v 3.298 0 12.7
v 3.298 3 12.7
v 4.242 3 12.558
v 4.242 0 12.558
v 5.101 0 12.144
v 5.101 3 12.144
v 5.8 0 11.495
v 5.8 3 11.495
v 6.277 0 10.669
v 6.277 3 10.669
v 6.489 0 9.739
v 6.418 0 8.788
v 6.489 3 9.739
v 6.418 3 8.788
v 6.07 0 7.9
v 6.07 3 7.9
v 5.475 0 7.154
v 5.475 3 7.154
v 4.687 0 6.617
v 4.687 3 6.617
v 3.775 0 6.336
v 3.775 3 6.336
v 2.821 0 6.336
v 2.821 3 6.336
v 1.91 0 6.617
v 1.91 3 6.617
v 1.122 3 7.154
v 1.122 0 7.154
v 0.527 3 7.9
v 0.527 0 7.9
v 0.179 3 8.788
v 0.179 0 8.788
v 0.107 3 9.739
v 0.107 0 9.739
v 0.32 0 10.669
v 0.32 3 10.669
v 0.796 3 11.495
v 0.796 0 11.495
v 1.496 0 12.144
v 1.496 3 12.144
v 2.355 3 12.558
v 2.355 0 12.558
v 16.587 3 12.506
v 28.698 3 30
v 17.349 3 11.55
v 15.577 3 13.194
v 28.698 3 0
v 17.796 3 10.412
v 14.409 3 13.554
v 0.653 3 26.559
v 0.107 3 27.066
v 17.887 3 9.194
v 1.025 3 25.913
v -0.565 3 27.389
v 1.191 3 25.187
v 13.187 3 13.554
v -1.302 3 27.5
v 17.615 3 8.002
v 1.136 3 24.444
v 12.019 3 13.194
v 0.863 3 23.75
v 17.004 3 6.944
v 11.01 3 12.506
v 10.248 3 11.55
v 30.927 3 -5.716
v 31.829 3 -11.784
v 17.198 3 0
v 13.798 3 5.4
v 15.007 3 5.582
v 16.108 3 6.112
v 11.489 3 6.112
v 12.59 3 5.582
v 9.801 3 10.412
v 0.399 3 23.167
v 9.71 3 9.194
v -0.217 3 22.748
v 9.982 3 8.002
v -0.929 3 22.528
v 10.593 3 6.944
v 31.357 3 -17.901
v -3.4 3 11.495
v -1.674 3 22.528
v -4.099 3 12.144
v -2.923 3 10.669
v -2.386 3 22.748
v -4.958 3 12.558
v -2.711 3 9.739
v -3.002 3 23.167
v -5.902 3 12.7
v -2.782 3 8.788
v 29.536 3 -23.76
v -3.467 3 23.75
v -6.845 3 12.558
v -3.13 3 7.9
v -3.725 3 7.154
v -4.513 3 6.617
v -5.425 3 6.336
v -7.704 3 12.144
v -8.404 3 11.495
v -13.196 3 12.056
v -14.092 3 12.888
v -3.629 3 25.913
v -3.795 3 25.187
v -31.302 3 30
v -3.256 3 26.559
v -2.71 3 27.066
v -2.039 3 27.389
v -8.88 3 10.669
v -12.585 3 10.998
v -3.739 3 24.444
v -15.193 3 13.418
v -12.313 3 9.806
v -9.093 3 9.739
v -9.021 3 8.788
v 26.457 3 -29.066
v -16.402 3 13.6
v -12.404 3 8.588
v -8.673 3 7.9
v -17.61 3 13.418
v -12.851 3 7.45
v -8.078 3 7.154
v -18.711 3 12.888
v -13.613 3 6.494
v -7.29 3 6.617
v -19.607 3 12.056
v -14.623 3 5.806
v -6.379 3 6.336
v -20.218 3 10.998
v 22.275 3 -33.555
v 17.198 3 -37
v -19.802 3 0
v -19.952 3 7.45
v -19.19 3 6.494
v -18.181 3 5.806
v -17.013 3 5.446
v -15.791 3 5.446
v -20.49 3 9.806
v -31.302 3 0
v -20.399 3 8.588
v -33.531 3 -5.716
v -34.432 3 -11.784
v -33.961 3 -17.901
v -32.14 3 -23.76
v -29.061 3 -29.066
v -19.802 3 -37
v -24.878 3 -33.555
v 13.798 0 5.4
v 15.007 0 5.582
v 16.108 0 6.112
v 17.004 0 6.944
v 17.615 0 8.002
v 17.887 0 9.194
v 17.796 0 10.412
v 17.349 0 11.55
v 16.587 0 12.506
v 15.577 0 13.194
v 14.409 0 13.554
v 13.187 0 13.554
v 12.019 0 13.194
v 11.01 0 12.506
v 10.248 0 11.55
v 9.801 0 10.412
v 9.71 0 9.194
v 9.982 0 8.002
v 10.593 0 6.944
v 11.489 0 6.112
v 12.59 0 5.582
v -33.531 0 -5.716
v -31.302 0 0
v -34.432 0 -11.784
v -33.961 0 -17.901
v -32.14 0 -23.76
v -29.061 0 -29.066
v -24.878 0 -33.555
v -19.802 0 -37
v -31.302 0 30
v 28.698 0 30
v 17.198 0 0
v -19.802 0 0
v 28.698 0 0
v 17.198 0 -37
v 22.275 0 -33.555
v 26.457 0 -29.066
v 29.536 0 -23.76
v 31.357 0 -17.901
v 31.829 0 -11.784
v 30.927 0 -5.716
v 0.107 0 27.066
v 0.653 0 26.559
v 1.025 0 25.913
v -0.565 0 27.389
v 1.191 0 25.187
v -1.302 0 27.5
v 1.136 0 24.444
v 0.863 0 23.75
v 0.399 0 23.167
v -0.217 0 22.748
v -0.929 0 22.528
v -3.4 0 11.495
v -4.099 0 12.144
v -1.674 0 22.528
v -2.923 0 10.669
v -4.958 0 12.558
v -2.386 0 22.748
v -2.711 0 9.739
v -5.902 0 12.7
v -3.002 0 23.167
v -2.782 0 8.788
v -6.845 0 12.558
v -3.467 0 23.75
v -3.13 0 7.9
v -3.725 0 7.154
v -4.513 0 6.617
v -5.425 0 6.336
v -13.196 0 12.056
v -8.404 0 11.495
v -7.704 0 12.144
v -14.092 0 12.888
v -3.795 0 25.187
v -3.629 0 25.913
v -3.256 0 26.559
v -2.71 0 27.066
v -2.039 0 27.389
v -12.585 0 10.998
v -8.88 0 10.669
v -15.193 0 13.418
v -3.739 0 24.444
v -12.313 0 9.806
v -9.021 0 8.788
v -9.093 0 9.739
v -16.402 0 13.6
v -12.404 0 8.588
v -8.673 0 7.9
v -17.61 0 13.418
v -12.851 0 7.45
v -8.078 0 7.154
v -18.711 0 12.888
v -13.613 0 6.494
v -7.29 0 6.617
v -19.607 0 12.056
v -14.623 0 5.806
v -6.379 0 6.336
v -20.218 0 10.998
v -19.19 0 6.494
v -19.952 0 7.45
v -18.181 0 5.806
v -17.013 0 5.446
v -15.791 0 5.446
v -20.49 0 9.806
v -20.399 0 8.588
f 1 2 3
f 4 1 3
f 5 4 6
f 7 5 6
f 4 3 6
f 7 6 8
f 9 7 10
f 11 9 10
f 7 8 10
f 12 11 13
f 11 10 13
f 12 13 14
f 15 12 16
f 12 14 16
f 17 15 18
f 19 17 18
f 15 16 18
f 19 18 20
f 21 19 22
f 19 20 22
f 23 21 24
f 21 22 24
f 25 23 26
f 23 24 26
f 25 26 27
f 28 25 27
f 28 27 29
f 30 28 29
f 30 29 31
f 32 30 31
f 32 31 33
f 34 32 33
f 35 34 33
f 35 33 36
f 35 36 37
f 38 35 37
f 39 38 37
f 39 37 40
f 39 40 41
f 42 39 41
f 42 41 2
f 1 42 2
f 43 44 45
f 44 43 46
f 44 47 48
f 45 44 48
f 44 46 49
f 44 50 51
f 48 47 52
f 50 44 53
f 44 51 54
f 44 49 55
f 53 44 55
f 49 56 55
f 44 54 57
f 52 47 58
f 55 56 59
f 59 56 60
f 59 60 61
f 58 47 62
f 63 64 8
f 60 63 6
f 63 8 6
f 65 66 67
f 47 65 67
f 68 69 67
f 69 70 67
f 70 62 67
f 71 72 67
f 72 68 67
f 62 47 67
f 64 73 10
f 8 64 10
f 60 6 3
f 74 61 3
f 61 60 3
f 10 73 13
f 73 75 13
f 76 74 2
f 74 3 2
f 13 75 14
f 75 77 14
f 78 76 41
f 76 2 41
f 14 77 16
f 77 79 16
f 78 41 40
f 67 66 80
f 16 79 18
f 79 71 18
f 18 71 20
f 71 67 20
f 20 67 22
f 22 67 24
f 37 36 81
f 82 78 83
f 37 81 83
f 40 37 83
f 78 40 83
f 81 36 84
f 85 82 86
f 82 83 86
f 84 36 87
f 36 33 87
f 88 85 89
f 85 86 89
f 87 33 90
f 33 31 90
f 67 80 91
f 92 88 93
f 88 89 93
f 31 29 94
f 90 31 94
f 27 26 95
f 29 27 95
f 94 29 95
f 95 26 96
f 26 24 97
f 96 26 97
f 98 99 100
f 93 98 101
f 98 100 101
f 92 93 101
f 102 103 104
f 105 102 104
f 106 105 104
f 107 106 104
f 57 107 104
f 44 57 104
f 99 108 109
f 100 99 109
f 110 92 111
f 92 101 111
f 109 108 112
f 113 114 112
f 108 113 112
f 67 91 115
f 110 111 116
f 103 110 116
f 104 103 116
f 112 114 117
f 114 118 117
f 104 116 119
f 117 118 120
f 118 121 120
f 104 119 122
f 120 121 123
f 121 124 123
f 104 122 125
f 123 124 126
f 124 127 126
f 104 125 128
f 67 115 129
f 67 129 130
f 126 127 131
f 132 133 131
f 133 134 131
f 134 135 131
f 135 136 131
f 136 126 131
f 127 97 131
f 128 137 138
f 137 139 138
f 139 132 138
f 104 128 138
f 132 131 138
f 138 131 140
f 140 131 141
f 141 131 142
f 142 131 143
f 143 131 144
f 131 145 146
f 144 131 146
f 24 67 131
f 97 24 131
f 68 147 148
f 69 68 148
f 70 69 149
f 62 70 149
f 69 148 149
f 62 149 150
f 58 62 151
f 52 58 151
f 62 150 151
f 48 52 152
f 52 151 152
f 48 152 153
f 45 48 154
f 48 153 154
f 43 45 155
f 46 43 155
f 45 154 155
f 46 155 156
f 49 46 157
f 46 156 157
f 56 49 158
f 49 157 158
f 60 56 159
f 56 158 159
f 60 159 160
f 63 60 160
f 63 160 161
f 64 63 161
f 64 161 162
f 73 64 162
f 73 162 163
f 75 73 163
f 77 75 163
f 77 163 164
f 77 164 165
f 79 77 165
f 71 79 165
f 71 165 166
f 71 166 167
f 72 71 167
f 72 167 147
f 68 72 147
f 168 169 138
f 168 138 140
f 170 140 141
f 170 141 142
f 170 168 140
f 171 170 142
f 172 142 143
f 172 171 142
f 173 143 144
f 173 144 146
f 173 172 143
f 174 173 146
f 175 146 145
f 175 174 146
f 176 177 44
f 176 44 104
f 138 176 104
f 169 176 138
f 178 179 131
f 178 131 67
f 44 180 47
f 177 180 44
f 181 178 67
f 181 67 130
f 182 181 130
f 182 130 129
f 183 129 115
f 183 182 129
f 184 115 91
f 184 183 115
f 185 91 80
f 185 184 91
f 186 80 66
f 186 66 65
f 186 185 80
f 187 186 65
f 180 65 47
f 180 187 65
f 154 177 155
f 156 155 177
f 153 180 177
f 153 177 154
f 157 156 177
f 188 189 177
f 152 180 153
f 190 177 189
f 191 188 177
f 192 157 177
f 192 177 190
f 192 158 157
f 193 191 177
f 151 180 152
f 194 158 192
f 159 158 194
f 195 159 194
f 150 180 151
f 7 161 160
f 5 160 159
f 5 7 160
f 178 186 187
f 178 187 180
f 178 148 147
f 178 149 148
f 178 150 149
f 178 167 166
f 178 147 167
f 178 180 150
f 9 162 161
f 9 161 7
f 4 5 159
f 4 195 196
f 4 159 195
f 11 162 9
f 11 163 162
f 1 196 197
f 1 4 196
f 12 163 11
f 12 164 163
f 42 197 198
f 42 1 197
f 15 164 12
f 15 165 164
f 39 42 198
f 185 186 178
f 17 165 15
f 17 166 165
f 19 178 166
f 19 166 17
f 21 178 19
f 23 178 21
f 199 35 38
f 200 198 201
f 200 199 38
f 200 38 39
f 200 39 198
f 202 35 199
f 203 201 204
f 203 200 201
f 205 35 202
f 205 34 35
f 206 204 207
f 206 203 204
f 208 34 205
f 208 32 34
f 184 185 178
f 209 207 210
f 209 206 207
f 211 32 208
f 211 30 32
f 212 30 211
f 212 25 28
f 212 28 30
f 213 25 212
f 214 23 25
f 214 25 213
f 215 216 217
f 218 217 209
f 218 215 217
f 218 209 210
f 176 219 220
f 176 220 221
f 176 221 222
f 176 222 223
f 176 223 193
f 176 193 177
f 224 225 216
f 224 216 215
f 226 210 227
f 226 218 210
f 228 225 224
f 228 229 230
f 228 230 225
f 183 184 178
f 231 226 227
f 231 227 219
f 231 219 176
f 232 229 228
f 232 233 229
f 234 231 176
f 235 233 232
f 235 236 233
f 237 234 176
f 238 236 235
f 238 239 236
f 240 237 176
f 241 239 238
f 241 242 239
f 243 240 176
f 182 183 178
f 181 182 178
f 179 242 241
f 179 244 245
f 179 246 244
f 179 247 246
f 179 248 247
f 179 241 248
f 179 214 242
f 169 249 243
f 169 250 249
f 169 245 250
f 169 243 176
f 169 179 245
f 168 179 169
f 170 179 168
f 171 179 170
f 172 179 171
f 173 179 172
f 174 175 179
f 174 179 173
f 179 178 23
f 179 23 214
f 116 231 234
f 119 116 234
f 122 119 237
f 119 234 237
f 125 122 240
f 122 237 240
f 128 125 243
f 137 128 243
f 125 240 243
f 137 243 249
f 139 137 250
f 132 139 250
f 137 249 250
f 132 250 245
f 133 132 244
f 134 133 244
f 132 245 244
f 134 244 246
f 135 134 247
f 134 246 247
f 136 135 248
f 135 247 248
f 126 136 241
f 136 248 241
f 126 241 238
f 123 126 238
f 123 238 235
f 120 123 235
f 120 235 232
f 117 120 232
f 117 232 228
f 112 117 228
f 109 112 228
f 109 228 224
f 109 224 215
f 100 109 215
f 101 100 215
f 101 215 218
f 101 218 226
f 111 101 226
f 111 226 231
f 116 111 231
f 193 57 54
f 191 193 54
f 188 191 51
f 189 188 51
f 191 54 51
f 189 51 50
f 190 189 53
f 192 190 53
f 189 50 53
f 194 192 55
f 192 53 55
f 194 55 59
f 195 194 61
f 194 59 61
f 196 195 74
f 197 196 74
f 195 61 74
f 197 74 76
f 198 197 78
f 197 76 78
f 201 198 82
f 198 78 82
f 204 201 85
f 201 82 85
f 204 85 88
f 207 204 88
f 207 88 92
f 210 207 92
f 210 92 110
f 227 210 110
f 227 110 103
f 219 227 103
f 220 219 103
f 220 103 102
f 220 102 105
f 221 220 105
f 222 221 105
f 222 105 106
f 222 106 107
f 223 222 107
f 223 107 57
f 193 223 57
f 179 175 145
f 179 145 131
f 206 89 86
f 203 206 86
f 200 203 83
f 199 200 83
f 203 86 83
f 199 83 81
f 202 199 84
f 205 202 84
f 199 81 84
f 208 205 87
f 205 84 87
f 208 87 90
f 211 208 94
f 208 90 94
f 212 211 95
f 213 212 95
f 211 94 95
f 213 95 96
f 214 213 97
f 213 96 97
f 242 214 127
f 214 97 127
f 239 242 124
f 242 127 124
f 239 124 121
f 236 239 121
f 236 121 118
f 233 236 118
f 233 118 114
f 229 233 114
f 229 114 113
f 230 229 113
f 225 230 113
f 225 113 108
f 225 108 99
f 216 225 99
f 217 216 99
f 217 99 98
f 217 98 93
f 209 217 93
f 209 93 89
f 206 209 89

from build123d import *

# Parameters (mm, degrees)
BOSS_EXTRUDE1_DEPTH = 3
SKETCH2_R           = 2.5
CUT_EXTRUDE1_DEPTH  = 20
SKETCH3_W           = 5
SKETCH3_H           = 5
CUT_EXTRUDE2_DEPTH  = 10
SKETCH4_R           = 4.1
CUT_EXTRUDE3_DEPTH  = 10
SKETCH5_R           = 3.2
CUT_EXTRUDE4_DEPTH  = 10


with BuildPart() as part:
    # Sketch1 → Boss-Extrude1 (new body)
    with BuildSketch(Plane(origin=(0, 0, 0), x_dir=(1, 0, 0), z_dir=(0, 1, 0))):
        with BuildLine():
            Line((-19.801702617, 0), (17.198297383, 0))
            Line((17.198297383, 0), (17.198297383, 37))
            ThreePointArc((17.198297383, 37), (30.611248287, 20.881727984), (28.698297383, 0))
            Line((28.698297383, 0), (28.698297383, -30))
            Line((28.698297383, -30), (-31.301702617, -30))
            Line((-31.301702617, -30), (-31.301702617, 0))
            ThreePointArc((-31.301702617, 0), (-33.214653521, 20.881727984), (-19.801702617, 37))
            Line((-19.801702617, 37), (-19.801702617, 0))
        make_face()
    extrude(amount=BOSS_EXTRUDE1_DEPTH)

    # Sketch2 → Cut-Extrude1 (cut)
    with BuildSketch(Plane(origin=(0, 3, 0), x_dir=(1, 0, 0), z_dir=(0, 1, 0))):
        with Locations(Location((-1.301702617, -25, 0), (0, 0, 270))):
            Circle(SKETCH2_R)
    extrude(amount=-CUT_EXTRUDE1_DEPTH, mode=Mode.SUBTRACT)

    # Sketch3 → Cut-Extrude2 (cut)
    with BuildSketch(Plane.XZ):
        with Locations((13.798297383, 9.5)):
            Rectangle(SKETCH3_W, SKETCH3_H)
        with Locations((-16.401702617, 9.5)):
            Rectangle(SKETCH3_W, SKETCH3_H)
    extrude(amount=-CUT_EXTRUDE2_DEPTH, mode=Mode.SUBTRACT)

    # Sketch4 → Cut-Extrude3 (cut)
    with BuildSketch(Plane.XZ):
        with Locations(Location((13.798297383, 9.5, 0), (0, 0, 270))):
            Circle(SKETCH4_R)
        with Locations(Location((-16.401702617, 9.5, 0), (0, 0, 90))):
            Circle(SKETCH4_R)
    extrude(amount=-CUT_EXTRUDE3_DEPTH, mode=Mode.SUBTRACT)

    # Sketch5 → Cut-Extrude4 (cut)
    with BuildSketch(Plane(origin=(0, 3, 0), x_dir=(1, 0, 0), z_dir=(0, 1, 0))):
        with Locations(Location((-5.901702617, -9.5, 0), (0, 0, 270))):
            Circle(SKETCH5_R)
        with Locations(Location((3.298297383, -9.5, 0), (0, 0, 270))):
            Circle(SKETCH5_R)
    extrude(amount=-CUT_EXTRUDE4_DEPTH, mode=Mode.SUBTRACT)


solid = part.part
